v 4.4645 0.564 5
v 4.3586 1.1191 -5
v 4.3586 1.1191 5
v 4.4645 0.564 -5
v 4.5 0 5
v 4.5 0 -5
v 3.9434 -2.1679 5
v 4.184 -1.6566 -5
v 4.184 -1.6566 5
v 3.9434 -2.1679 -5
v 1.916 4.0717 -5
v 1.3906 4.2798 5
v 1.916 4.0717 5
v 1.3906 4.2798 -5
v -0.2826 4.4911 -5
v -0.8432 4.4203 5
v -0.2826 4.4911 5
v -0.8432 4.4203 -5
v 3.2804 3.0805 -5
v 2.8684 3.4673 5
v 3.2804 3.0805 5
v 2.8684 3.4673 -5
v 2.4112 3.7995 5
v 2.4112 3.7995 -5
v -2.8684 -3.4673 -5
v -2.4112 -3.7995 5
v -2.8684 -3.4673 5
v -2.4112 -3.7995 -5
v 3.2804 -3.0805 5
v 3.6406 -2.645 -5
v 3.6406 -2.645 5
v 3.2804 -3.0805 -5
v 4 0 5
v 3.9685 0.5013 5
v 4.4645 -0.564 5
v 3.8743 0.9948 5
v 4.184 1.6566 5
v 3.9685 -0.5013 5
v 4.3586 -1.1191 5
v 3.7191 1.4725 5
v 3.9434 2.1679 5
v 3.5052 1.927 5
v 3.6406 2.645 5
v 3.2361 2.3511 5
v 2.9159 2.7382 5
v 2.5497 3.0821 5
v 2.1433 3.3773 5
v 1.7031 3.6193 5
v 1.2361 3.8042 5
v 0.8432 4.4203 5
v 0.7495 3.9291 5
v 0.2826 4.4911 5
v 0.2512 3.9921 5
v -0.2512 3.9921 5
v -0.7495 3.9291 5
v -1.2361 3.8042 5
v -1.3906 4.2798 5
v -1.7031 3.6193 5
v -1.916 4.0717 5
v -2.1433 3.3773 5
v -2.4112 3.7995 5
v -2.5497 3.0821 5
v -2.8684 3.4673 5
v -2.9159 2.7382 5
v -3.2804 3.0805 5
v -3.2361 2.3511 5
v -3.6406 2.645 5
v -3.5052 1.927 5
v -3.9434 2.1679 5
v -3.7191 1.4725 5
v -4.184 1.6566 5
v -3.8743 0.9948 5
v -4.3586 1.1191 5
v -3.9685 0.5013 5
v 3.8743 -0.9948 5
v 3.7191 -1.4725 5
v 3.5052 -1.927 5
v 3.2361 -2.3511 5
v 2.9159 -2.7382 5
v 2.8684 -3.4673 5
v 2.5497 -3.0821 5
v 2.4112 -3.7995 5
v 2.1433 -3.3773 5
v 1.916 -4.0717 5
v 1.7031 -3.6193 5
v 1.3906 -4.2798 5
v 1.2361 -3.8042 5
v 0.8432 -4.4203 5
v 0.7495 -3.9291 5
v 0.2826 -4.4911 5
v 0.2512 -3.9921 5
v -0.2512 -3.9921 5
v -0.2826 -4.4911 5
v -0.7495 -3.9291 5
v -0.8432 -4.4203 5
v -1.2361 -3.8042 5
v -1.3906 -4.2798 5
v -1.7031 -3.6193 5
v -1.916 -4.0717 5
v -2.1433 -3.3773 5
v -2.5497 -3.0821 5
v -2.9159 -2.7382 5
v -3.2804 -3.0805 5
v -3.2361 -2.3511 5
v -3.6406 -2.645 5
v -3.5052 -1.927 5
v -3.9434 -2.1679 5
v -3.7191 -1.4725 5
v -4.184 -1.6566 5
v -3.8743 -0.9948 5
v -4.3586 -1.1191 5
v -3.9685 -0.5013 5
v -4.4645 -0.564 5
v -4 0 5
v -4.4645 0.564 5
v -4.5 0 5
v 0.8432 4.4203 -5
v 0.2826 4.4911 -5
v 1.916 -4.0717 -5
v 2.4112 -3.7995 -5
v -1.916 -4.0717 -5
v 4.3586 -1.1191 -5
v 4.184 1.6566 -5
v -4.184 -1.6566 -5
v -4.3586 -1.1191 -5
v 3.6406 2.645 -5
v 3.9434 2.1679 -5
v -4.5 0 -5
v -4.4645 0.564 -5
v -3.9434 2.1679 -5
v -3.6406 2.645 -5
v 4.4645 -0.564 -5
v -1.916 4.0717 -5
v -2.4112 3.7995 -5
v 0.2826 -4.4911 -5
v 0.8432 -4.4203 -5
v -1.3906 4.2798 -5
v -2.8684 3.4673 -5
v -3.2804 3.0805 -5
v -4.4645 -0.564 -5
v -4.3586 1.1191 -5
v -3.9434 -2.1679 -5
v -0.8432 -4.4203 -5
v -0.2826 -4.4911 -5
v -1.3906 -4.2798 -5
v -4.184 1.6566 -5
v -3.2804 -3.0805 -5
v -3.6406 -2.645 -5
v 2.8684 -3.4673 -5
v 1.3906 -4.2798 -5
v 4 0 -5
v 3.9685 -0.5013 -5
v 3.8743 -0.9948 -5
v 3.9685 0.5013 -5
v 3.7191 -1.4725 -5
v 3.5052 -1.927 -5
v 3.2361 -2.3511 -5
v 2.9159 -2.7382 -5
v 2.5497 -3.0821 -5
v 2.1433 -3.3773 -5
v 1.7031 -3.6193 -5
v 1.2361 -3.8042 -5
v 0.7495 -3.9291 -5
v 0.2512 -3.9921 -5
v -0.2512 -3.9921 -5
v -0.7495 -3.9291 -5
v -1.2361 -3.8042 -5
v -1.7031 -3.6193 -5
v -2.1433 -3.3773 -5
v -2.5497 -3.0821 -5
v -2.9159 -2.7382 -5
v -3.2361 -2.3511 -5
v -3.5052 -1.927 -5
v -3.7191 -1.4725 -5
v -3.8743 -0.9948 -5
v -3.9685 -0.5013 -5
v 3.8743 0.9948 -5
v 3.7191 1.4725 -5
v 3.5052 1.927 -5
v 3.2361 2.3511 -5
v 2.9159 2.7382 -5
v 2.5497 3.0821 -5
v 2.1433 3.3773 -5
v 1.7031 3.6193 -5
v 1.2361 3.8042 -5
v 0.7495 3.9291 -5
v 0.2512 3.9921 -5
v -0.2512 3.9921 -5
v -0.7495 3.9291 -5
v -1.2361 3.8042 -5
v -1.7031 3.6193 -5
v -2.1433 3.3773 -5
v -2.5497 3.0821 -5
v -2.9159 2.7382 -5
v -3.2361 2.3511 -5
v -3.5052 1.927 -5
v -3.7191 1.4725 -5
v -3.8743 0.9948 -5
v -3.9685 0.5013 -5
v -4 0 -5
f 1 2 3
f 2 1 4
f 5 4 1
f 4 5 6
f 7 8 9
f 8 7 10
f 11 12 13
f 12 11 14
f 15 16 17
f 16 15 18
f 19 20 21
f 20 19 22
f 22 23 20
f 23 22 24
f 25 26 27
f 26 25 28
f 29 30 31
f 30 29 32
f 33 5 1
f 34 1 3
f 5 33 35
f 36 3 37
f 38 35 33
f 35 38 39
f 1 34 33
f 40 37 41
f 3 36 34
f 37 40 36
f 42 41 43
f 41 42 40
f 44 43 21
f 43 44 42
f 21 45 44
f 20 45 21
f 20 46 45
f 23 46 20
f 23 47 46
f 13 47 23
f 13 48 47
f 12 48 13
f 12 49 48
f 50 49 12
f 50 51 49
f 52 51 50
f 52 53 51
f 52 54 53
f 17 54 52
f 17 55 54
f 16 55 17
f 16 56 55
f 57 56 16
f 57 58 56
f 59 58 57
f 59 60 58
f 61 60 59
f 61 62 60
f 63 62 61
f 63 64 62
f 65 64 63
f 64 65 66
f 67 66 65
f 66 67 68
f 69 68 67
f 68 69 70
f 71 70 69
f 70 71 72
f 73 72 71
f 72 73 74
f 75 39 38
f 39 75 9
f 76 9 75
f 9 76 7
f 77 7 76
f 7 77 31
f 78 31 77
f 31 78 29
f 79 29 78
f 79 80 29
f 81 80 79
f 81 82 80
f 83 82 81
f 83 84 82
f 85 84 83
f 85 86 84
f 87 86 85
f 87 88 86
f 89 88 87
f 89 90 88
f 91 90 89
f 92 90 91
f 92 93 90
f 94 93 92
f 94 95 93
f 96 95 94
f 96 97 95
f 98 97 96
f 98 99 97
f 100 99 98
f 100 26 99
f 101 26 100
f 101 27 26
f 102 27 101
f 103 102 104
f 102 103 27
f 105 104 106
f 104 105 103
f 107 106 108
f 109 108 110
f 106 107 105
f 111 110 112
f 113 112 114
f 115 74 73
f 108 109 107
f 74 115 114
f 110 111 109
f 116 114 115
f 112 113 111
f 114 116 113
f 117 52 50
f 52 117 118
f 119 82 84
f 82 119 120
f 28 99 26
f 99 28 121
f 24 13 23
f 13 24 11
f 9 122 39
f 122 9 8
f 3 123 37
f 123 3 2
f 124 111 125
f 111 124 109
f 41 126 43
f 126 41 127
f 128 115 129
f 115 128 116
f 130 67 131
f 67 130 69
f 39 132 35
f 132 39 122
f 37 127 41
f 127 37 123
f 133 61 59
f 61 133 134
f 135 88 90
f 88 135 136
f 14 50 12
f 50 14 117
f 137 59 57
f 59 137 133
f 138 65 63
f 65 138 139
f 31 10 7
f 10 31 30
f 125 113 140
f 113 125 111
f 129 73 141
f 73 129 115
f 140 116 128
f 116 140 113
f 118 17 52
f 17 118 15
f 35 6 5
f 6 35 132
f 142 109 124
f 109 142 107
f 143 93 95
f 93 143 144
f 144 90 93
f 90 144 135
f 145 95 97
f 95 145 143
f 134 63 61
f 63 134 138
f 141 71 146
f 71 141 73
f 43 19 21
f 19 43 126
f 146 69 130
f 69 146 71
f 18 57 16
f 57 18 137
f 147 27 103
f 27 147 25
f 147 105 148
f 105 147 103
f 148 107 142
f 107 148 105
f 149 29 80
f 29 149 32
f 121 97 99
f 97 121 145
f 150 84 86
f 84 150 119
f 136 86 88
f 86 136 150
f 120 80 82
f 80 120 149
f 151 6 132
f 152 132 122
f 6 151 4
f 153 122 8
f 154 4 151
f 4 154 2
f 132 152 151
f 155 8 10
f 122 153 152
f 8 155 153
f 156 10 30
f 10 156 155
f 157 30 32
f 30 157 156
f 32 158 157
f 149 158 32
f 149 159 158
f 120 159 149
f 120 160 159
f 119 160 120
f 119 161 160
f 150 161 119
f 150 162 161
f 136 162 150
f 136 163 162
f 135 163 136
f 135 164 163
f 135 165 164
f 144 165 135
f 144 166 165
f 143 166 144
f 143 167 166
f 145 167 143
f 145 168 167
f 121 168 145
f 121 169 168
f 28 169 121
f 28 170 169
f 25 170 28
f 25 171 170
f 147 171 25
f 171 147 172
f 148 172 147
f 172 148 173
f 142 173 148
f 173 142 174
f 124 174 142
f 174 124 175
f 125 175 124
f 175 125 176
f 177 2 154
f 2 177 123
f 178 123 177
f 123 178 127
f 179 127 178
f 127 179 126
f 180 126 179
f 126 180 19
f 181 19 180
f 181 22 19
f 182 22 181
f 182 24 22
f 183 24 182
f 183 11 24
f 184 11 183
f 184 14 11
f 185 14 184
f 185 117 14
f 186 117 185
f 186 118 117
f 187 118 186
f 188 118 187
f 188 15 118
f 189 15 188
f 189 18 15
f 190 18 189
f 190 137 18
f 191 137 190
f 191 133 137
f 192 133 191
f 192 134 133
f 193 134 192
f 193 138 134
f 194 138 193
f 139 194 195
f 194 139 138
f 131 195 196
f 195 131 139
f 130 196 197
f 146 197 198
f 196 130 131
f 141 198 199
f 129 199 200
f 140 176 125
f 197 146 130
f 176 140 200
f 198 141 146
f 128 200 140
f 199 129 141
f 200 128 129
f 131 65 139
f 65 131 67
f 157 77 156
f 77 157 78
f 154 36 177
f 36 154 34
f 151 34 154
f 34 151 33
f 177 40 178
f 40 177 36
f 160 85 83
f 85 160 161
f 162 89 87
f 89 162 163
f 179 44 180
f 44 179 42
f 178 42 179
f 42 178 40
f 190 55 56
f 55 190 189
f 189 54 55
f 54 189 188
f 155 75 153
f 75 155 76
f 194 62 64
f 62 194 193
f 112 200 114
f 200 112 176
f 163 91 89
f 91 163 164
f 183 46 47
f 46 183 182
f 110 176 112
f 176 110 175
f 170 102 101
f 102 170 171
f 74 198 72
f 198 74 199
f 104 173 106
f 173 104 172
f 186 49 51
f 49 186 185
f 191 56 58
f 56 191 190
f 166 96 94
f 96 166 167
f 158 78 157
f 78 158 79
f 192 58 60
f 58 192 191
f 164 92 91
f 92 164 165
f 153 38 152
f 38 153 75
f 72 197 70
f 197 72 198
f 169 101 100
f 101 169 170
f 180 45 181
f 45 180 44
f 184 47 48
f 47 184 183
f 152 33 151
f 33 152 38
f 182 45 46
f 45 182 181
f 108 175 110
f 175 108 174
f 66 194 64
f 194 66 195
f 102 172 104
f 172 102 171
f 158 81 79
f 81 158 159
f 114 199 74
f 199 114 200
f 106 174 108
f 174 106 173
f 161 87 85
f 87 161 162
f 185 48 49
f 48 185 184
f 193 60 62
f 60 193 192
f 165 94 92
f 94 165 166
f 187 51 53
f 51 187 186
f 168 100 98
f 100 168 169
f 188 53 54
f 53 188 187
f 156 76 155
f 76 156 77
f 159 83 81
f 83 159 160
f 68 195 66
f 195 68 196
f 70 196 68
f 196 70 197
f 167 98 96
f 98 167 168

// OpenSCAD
$fn = 50;


difference() {
	union() {
		translate(v = [0, 0, -5.0000000000]) {
			cylinder(h = 10, r = 4.5000000000);
		}
	}
	union() {
		translate(v = [0, 0, -100.0000000000]) {
			cylinder(h = 200, r = 4.0000000000);
		}
	}
}
